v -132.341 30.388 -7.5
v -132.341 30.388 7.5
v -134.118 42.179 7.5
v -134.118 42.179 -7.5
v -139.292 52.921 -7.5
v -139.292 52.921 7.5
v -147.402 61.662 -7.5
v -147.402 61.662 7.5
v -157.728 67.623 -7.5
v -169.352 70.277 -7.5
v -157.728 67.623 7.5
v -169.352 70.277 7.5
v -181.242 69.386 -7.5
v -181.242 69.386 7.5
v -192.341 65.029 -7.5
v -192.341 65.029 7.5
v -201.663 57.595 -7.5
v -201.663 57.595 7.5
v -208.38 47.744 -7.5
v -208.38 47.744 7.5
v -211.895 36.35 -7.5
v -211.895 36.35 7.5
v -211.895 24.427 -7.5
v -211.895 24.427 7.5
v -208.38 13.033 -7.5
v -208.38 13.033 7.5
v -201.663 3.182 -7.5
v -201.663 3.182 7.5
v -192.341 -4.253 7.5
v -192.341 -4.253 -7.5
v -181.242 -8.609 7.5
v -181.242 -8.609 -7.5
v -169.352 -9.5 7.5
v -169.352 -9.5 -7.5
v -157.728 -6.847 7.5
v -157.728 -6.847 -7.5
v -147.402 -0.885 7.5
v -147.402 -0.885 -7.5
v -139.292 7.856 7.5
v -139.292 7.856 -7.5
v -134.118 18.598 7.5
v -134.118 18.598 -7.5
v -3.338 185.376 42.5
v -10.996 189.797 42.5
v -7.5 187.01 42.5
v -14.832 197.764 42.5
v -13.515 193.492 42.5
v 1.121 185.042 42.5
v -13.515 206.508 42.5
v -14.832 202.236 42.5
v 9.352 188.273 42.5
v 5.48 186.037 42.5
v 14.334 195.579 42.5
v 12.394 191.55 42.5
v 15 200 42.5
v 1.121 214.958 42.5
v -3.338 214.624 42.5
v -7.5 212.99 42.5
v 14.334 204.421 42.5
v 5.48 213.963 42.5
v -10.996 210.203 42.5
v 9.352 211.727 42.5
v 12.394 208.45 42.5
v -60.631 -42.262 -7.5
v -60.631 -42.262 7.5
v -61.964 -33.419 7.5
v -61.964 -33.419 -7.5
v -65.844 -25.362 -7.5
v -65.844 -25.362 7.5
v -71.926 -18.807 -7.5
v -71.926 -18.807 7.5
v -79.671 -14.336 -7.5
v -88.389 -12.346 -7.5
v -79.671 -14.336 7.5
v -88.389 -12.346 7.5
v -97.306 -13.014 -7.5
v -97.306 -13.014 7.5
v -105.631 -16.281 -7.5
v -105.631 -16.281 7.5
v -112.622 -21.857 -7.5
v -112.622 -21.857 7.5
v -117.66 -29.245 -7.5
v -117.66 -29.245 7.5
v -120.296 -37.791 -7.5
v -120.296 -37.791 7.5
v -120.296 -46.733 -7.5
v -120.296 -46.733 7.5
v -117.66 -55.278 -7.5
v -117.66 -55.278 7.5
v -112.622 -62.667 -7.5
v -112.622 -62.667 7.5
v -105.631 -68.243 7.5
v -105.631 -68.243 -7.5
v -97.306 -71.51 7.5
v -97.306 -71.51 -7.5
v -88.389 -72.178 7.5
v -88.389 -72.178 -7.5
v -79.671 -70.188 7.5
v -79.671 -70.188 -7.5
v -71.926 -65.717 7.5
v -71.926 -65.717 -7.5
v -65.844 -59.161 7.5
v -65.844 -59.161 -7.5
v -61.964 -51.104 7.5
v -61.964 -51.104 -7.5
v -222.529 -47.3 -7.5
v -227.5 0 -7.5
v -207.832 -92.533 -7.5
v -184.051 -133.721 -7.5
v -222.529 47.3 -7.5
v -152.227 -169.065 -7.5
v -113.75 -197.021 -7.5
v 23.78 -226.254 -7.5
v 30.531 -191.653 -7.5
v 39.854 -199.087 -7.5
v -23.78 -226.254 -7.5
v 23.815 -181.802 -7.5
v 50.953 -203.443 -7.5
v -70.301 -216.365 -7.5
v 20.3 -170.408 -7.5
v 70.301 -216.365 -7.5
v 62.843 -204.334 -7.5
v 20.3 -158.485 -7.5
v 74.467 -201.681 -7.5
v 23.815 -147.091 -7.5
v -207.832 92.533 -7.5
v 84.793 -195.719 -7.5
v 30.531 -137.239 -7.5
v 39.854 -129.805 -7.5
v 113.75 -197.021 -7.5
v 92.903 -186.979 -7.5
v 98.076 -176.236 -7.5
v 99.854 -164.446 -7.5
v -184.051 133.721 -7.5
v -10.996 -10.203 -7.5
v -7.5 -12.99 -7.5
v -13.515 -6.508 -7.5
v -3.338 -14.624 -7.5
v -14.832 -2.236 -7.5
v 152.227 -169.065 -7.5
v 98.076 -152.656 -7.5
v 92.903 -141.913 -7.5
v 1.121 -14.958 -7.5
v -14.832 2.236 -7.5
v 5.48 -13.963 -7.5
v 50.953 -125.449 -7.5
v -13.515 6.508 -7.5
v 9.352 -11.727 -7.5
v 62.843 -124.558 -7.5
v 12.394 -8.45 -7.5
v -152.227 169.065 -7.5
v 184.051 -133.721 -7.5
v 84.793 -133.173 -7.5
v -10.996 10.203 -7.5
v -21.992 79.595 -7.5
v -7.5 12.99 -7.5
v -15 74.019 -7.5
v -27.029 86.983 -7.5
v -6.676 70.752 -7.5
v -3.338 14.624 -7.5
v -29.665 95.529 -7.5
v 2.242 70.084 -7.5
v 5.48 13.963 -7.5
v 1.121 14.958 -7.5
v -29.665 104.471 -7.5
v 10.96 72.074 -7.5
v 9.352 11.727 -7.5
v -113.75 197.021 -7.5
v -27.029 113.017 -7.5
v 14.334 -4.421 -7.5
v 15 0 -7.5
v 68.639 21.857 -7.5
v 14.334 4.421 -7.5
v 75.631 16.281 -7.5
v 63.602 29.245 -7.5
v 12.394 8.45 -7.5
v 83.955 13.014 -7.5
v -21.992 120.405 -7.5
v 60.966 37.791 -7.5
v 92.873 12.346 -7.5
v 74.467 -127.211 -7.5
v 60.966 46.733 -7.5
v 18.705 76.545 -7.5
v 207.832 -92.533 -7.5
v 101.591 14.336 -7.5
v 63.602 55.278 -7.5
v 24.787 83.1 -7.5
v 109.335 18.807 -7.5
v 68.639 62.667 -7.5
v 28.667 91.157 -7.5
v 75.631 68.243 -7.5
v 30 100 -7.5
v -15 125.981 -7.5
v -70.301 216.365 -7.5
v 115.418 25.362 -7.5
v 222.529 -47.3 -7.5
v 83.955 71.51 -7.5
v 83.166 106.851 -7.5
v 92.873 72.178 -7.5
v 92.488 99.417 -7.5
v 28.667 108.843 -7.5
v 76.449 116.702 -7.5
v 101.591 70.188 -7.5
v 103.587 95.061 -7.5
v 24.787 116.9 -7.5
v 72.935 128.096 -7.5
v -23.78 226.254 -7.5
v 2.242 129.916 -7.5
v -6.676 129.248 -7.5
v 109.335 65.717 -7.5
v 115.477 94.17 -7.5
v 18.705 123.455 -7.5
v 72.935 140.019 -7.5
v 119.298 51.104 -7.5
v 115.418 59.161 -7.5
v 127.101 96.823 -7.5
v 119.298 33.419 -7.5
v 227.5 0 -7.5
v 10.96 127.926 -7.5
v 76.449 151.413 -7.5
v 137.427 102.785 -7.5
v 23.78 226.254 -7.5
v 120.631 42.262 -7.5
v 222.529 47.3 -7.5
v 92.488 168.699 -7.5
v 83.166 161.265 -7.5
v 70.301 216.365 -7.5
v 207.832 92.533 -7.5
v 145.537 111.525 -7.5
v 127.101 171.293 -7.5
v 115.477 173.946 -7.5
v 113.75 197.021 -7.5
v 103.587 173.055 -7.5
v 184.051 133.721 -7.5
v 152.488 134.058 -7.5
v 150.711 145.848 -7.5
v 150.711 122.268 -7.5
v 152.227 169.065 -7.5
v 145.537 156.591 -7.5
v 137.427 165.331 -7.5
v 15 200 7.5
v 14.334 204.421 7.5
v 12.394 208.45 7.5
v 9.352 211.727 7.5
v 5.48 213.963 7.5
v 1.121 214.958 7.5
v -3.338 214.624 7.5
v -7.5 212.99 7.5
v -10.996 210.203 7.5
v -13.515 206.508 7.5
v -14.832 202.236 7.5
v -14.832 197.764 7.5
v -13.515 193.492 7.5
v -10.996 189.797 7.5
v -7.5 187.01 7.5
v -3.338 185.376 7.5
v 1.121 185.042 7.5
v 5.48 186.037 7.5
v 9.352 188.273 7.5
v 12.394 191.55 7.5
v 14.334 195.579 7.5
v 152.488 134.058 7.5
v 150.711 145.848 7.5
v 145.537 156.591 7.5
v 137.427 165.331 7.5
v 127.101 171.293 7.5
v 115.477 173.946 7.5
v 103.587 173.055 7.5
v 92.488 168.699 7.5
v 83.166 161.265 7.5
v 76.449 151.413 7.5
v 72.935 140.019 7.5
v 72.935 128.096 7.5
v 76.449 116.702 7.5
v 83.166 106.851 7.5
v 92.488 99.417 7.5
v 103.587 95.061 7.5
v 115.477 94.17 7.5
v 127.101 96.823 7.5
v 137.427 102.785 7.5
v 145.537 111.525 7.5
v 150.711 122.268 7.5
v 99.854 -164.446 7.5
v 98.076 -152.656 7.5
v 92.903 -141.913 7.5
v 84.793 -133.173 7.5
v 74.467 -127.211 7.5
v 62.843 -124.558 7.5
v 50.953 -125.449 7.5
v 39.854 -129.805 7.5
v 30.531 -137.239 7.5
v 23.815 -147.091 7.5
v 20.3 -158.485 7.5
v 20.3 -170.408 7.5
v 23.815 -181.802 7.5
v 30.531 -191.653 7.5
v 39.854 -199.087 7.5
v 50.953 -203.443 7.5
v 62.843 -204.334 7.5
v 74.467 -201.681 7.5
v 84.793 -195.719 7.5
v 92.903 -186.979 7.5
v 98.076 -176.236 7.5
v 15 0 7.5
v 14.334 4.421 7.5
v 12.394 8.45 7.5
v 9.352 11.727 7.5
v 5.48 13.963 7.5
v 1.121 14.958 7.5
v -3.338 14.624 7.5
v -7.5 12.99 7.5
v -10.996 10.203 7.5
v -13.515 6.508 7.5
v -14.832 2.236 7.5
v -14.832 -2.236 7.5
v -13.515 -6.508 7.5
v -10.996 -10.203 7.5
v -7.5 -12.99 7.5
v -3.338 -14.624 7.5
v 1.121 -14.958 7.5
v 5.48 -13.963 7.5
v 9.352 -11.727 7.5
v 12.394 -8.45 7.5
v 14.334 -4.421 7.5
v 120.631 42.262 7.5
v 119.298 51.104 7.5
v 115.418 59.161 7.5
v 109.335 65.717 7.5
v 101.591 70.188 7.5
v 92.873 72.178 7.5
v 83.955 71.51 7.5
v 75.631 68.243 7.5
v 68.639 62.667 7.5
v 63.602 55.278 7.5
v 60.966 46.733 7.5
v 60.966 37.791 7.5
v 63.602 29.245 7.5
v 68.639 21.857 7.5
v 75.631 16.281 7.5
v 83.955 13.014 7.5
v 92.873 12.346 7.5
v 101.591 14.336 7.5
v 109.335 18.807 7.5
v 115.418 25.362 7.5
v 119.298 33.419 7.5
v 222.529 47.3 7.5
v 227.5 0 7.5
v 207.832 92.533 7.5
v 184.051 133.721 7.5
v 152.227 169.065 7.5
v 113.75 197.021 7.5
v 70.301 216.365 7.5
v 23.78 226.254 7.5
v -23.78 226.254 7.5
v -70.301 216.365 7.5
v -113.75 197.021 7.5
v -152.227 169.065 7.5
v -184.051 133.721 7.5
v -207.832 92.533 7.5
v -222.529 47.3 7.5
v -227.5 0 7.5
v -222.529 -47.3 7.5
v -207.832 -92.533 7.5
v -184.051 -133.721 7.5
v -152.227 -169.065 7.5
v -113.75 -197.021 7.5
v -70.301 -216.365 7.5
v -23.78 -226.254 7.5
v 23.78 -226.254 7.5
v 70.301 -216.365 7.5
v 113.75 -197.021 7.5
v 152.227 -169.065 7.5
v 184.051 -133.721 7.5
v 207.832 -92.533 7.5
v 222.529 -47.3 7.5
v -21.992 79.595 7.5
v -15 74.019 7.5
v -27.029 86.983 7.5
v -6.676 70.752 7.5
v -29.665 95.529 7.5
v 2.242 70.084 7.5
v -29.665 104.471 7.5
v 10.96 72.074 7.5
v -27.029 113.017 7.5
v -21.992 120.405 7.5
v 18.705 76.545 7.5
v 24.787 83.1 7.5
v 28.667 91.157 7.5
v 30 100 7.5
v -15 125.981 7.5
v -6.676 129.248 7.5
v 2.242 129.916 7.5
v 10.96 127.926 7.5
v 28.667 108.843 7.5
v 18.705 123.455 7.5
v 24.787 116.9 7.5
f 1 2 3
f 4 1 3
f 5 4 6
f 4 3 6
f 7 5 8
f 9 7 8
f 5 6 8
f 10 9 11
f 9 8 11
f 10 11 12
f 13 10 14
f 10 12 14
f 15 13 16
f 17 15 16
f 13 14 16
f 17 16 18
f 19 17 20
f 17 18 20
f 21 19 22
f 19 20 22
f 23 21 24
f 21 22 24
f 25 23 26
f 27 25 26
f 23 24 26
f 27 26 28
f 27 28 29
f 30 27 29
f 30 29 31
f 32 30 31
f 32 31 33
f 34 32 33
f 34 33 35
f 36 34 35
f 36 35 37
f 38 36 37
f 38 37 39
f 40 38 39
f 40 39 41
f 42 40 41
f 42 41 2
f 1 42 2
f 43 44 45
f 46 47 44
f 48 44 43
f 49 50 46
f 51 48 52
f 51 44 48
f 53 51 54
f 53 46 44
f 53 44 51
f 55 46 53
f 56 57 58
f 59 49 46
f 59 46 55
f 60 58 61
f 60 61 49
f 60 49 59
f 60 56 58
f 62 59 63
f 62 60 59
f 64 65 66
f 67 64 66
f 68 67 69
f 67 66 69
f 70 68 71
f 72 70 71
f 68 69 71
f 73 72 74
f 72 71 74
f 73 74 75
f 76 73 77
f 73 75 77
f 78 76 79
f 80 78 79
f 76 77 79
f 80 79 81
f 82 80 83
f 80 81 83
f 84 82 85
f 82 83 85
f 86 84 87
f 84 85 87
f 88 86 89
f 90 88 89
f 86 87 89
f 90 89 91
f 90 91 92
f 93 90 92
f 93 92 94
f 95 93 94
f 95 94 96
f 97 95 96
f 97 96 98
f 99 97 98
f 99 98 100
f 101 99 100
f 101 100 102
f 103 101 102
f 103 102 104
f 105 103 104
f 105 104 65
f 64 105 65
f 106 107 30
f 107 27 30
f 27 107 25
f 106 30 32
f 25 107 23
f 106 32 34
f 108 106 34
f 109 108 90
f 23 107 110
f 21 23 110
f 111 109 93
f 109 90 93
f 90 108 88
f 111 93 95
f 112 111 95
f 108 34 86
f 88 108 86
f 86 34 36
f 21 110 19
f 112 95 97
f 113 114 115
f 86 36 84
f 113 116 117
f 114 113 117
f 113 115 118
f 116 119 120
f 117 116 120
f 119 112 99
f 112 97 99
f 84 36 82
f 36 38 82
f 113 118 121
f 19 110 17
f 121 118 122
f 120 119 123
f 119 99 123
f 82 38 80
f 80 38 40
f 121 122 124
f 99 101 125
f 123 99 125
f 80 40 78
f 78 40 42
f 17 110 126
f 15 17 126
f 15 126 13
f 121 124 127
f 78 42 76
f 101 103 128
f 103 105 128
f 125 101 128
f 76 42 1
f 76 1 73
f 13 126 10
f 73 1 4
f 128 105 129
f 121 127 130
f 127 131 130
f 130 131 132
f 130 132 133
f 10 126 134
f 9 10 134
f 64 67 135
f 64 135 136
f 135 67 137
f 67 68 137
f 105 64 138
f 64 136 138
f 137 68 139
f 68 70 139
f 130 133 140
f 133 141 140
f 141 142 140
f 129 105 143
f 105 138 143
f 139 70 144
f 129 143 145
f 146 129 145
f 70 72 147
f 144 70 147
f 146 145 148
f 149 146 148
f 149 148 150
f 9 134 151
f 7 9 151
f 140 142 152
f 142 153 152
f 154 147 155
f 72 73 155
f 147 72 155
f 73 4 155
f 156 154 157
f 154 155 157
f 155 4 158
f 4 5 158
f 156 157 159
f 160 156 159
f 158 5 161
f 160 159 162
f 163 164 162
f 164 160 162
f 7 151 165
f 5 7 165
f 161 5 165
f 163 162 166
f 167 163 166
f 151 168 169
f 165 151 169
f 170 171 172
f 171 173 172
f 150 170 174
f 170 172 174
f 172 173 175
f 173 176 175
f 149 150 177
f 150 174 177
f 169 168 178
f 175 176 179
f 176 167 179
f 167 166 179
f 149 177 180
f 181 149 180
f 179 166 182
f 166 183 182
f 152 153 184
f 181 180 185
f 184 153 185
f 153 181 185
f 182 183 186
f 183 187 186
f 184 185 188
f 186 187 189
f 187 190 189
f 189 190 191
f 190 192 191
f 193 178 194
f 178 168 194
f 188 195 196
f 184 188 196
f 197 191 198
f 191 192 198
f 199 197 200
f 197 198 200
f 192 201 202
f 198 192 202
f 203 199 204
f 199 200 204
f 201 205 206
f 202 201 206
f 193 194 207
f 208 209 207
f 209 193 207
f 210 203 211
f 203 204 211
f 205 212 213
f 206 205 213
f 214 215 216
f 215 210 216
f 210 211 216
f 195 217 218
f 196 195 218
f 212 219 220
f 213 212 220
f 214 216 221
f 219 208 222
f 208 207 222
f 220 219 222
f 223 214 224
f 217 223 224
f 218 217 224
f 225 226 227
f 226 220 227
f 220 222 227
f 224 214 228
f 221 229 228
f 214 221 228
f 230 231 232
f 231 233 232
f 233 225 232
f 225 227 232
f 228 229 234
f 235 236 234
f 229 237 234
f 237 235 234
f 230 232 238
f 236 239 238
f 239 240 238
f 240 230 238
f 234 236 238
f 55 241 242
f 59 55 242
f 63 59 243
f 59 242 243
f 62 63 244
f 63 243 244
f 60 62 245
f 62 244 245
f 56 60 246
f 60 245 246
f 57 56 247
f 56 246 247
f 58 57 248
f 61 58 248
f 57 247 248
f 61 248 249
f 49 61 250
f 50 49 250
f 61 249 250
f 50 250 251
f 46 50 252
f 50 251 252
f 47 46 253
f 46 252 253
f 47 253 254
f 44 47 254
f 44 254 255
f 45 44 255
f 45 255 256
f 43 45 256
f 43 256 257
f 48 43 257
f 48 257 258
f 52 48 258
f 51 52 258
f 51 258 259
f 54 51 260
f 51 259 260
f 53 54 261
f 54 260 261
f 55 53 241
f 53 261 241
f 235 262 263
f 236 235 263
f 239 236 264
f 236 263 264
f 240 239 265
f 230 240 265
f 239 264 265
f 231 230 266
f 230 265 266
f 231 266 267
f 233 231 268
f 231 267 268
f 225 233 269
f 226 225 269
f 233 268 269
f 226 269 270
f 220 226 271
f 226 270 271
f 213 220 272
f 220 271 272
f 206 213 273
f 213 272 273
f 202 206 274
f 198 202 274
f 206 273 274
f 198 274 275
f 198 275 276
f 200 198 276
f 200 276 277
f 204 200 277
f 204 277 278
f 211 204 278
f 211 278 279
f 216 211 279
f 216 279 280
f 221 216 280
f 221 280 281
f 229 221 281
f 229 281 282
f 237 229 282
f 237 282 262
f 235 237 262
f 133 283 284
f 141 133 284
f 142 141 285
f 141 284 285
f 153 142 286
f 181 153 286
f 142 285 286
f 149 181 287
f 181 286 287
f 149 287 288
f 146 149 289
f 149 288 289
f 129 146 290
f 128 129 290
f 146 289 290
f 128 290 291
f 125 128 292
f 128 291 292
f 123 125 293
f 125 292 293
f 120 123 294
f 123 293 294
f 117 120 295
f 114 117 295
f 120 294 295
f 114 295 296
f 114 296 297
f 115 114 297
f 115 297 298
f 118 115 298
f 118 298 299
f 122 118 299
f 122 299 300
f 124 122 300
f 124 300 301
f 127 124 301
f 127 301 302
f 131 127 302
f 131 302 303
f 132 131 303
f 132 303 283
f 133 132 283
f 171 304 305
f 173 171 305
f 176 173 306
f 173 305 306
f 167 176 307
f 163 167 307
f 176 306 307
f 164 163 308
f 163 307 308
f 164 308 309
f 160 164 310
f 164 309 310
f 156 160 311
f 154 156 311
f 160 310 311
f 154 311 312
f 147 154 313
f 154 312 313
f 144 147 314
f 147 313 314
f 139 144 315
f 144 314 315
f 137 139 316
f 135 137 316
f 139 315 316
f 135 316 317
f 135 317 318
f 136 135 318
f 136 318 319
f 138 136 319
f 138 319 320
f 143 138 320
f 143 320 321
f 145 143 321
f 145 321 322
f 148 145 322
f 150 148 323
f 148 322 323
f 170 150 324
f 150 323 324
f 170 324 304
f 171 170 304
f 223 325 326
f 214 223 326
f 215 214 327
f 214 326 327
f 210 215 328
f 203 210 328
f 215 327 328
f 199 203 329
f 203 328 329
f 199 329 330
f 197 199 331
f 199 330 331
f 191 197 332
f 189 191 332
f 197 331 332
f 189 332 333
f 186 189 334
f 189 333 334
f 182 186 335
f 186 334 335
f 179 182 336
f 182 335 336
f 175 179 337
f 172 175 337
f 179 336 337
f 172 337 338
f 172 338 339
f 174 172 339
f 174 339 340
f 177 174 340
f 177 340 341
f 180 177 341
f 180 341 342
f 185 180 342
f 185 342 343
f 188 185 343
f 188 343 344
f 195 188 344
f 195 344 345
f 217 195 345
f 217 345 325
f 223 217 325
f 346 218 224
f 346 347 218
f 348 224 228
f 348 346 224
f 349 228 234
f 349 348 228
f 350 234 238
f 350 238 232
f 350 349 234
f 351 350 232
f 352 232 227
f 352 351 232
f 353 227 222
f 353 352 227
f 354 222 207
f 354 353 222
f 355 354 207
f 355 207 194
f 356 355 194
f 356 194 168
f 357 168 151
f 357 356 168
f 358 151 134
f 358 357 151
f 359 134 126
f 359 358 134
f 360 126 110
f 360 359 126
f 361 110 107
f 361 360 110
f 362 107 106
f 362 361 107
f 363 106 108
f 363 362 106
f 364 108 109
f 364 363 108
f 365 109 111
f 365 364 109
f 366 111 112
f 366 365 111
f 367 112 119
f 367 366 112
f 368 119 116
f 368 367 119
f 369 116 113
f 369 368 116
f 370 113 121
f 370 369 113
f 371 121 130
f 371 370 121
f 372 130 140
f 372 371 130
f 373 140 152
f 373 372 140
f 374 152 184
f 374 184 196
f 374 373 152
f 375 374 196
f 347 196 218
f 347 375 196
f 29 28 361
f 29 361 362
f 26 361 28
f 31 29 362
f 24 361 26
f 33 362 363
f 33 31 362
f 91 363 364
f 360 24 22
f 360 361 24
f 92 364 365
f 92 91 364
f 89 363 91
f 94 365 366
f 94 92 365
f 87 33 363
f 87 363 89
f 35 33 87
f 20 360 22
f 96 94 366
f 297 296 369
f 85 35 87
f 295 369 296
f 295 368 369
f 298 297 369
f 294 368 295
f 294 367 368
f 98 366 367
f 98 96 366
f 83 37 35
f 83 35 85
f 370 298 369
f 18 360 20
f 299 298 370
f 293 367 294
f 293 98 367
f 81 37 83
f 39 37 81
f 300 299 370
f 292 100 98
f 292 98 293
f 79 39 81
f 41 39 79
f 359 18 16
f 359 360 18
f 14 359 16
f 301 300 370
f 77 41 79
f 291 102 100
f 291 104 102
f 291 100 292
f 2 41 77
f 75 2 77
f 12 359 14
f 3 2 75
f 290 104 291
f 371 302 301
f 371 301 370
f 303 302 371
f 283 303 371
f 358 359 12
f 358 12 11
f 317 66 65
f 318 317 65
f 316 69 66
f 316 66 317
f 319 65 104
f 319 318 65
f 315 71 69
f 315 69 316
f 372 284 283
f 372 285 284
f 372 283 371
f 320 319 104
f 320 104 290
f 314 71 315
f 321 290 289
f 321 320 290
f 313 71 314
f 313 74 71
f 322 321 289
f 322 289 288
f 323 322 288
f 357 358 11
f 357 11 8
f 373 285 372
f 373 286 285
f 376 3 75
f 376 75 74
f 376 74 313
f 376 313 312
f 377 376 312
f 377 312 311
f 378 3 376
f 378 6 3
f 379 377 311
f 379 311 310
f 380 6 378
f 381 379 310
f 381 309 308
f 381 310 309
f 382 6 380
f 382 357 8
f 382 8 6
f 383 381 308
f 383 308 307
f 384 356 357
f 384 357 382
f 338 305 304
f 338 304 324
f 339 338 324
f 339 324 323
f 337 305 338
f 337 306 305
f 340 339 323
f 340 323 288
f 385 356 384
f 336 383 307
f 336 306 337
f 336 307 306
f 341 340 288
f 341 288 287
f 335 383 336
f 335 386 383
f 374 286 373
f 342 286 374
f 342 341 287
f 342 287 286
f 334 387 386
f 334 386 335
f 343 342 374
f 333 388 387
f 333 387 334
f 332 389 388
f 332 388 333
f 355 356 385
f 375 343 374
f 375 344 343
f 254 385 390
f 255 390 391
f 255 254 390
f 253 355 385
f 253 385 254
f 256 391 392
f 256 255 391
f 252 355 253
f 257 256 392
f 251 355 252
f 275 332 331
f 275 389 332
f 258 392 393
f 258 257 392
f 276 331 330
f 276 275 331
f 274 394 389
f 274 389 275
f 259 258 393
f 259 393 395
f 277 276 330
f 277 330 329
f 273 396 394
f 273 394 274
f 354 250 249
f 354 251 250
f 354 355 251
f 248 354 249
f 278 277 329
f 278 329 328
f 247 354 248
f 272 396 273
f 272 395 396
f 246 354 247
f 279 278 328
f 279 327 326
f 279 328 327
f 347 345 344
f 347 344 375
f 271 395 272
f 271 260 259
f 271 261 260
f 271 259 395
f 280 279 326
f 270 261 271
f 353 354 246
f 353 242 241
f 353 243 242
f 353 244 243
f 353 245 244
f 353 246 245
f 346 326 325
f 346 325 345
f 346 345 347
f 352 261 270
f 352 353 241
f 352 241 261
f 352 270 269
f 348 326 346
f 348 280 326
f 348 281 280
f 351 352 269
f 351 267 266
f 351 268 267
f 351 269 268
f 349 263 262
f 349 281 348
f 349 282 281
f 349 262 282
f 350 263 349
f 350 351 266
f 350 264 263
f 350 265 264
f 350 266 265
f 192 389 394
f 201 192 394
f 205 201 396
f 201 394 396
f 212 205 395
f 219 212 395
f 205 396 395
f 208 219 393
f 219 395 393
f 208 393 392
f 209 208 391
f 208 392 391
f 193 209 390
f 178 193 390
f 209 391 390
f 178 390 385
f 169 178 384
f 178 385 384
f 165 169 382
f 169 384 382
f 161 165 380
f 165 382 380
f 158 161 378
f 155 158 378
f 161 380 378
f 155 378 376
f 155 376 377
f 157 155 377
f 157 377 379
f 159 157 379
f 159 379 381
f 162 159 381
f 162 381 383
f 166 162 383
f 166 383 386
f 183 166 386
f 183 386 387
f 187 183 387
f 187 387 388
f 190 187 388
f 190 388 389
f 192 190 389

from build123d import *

# Parameters (mm, degrees)
SKETCH1_R           = 227.5
BOSS_EXTRUDE1_DEPTH = 7.5
BOSS_EXTRUDE2_START = 7.5
SKETCH1_3_R         = 15
BOSS_EXTRUDE2_DEPTH = 35
SKETCH2_R           = 40
SKETCH2_R_2         = 30
CUT_EXTRUDE1_DEPTH  = 16
CUT_EXTRUDE3_START  = 7.5
SKETCH3_R           = 15
CUT_EXTRUDE3_DEPTH  = 15


with BuildPart() as part:
    # Sketch1 → Boss-Extrude1 (new body, symmetric)
    with BuildSketch(Plane.XY):
        Circle(SKETCH1_R)
    extrude(amount=BOSS_EXTRUDE1_DEPTH, both=True)

    # Sketch1<3> → Boss-Extrude2 (add)
    with BuildSketch(Plane.XY.offset(BOSS_EXTRUDE2_START)):
        with Locations((0, 200)):
            Circle(SKETCH1_3_R)
    extrude(amount=BOSS_EXTRUDE2_DEPTH)

    # Sketch2 → Cut-Extrude1 (cut, through all)
    with BuildSketch(Plane.XY.offset(7.5)):
        with Locations((-172.341356777, 30.388431092)):
            Circle(SKETCH2_R)
        with Locations((0, 100)):
            Circle(SKETCH2_R_2)
        with Locations((90.630778704, 42.261826174)):
            Circle(SKETCH2_R_2)
        with Locations((-90.630778704, -42.261826174)):
            Circle(SKETCH2_R_2)
        with Locations((112.487831695, 134.057777546)):
            Circle(SKETCH2_R)
        with Locations((59.853525082, -164.446208638)):
            Circle(SKETCH2_R)
    extrude(amount=-CUT_EXTRUDE1_DEPTH, mode=Mode.SUBTRACT)

    # Sketch3 → Cut-Extrude3 (cut)
    with BuildSketch(Plane.XY.offset(CUT_EXTRUDE3_START)):
        Circle(SKETCH3_R)
    extrude(amount=-CUT_EXTRUDE3_DEPTH, mode=Mode.SUBTRACT)


solid = part.part
